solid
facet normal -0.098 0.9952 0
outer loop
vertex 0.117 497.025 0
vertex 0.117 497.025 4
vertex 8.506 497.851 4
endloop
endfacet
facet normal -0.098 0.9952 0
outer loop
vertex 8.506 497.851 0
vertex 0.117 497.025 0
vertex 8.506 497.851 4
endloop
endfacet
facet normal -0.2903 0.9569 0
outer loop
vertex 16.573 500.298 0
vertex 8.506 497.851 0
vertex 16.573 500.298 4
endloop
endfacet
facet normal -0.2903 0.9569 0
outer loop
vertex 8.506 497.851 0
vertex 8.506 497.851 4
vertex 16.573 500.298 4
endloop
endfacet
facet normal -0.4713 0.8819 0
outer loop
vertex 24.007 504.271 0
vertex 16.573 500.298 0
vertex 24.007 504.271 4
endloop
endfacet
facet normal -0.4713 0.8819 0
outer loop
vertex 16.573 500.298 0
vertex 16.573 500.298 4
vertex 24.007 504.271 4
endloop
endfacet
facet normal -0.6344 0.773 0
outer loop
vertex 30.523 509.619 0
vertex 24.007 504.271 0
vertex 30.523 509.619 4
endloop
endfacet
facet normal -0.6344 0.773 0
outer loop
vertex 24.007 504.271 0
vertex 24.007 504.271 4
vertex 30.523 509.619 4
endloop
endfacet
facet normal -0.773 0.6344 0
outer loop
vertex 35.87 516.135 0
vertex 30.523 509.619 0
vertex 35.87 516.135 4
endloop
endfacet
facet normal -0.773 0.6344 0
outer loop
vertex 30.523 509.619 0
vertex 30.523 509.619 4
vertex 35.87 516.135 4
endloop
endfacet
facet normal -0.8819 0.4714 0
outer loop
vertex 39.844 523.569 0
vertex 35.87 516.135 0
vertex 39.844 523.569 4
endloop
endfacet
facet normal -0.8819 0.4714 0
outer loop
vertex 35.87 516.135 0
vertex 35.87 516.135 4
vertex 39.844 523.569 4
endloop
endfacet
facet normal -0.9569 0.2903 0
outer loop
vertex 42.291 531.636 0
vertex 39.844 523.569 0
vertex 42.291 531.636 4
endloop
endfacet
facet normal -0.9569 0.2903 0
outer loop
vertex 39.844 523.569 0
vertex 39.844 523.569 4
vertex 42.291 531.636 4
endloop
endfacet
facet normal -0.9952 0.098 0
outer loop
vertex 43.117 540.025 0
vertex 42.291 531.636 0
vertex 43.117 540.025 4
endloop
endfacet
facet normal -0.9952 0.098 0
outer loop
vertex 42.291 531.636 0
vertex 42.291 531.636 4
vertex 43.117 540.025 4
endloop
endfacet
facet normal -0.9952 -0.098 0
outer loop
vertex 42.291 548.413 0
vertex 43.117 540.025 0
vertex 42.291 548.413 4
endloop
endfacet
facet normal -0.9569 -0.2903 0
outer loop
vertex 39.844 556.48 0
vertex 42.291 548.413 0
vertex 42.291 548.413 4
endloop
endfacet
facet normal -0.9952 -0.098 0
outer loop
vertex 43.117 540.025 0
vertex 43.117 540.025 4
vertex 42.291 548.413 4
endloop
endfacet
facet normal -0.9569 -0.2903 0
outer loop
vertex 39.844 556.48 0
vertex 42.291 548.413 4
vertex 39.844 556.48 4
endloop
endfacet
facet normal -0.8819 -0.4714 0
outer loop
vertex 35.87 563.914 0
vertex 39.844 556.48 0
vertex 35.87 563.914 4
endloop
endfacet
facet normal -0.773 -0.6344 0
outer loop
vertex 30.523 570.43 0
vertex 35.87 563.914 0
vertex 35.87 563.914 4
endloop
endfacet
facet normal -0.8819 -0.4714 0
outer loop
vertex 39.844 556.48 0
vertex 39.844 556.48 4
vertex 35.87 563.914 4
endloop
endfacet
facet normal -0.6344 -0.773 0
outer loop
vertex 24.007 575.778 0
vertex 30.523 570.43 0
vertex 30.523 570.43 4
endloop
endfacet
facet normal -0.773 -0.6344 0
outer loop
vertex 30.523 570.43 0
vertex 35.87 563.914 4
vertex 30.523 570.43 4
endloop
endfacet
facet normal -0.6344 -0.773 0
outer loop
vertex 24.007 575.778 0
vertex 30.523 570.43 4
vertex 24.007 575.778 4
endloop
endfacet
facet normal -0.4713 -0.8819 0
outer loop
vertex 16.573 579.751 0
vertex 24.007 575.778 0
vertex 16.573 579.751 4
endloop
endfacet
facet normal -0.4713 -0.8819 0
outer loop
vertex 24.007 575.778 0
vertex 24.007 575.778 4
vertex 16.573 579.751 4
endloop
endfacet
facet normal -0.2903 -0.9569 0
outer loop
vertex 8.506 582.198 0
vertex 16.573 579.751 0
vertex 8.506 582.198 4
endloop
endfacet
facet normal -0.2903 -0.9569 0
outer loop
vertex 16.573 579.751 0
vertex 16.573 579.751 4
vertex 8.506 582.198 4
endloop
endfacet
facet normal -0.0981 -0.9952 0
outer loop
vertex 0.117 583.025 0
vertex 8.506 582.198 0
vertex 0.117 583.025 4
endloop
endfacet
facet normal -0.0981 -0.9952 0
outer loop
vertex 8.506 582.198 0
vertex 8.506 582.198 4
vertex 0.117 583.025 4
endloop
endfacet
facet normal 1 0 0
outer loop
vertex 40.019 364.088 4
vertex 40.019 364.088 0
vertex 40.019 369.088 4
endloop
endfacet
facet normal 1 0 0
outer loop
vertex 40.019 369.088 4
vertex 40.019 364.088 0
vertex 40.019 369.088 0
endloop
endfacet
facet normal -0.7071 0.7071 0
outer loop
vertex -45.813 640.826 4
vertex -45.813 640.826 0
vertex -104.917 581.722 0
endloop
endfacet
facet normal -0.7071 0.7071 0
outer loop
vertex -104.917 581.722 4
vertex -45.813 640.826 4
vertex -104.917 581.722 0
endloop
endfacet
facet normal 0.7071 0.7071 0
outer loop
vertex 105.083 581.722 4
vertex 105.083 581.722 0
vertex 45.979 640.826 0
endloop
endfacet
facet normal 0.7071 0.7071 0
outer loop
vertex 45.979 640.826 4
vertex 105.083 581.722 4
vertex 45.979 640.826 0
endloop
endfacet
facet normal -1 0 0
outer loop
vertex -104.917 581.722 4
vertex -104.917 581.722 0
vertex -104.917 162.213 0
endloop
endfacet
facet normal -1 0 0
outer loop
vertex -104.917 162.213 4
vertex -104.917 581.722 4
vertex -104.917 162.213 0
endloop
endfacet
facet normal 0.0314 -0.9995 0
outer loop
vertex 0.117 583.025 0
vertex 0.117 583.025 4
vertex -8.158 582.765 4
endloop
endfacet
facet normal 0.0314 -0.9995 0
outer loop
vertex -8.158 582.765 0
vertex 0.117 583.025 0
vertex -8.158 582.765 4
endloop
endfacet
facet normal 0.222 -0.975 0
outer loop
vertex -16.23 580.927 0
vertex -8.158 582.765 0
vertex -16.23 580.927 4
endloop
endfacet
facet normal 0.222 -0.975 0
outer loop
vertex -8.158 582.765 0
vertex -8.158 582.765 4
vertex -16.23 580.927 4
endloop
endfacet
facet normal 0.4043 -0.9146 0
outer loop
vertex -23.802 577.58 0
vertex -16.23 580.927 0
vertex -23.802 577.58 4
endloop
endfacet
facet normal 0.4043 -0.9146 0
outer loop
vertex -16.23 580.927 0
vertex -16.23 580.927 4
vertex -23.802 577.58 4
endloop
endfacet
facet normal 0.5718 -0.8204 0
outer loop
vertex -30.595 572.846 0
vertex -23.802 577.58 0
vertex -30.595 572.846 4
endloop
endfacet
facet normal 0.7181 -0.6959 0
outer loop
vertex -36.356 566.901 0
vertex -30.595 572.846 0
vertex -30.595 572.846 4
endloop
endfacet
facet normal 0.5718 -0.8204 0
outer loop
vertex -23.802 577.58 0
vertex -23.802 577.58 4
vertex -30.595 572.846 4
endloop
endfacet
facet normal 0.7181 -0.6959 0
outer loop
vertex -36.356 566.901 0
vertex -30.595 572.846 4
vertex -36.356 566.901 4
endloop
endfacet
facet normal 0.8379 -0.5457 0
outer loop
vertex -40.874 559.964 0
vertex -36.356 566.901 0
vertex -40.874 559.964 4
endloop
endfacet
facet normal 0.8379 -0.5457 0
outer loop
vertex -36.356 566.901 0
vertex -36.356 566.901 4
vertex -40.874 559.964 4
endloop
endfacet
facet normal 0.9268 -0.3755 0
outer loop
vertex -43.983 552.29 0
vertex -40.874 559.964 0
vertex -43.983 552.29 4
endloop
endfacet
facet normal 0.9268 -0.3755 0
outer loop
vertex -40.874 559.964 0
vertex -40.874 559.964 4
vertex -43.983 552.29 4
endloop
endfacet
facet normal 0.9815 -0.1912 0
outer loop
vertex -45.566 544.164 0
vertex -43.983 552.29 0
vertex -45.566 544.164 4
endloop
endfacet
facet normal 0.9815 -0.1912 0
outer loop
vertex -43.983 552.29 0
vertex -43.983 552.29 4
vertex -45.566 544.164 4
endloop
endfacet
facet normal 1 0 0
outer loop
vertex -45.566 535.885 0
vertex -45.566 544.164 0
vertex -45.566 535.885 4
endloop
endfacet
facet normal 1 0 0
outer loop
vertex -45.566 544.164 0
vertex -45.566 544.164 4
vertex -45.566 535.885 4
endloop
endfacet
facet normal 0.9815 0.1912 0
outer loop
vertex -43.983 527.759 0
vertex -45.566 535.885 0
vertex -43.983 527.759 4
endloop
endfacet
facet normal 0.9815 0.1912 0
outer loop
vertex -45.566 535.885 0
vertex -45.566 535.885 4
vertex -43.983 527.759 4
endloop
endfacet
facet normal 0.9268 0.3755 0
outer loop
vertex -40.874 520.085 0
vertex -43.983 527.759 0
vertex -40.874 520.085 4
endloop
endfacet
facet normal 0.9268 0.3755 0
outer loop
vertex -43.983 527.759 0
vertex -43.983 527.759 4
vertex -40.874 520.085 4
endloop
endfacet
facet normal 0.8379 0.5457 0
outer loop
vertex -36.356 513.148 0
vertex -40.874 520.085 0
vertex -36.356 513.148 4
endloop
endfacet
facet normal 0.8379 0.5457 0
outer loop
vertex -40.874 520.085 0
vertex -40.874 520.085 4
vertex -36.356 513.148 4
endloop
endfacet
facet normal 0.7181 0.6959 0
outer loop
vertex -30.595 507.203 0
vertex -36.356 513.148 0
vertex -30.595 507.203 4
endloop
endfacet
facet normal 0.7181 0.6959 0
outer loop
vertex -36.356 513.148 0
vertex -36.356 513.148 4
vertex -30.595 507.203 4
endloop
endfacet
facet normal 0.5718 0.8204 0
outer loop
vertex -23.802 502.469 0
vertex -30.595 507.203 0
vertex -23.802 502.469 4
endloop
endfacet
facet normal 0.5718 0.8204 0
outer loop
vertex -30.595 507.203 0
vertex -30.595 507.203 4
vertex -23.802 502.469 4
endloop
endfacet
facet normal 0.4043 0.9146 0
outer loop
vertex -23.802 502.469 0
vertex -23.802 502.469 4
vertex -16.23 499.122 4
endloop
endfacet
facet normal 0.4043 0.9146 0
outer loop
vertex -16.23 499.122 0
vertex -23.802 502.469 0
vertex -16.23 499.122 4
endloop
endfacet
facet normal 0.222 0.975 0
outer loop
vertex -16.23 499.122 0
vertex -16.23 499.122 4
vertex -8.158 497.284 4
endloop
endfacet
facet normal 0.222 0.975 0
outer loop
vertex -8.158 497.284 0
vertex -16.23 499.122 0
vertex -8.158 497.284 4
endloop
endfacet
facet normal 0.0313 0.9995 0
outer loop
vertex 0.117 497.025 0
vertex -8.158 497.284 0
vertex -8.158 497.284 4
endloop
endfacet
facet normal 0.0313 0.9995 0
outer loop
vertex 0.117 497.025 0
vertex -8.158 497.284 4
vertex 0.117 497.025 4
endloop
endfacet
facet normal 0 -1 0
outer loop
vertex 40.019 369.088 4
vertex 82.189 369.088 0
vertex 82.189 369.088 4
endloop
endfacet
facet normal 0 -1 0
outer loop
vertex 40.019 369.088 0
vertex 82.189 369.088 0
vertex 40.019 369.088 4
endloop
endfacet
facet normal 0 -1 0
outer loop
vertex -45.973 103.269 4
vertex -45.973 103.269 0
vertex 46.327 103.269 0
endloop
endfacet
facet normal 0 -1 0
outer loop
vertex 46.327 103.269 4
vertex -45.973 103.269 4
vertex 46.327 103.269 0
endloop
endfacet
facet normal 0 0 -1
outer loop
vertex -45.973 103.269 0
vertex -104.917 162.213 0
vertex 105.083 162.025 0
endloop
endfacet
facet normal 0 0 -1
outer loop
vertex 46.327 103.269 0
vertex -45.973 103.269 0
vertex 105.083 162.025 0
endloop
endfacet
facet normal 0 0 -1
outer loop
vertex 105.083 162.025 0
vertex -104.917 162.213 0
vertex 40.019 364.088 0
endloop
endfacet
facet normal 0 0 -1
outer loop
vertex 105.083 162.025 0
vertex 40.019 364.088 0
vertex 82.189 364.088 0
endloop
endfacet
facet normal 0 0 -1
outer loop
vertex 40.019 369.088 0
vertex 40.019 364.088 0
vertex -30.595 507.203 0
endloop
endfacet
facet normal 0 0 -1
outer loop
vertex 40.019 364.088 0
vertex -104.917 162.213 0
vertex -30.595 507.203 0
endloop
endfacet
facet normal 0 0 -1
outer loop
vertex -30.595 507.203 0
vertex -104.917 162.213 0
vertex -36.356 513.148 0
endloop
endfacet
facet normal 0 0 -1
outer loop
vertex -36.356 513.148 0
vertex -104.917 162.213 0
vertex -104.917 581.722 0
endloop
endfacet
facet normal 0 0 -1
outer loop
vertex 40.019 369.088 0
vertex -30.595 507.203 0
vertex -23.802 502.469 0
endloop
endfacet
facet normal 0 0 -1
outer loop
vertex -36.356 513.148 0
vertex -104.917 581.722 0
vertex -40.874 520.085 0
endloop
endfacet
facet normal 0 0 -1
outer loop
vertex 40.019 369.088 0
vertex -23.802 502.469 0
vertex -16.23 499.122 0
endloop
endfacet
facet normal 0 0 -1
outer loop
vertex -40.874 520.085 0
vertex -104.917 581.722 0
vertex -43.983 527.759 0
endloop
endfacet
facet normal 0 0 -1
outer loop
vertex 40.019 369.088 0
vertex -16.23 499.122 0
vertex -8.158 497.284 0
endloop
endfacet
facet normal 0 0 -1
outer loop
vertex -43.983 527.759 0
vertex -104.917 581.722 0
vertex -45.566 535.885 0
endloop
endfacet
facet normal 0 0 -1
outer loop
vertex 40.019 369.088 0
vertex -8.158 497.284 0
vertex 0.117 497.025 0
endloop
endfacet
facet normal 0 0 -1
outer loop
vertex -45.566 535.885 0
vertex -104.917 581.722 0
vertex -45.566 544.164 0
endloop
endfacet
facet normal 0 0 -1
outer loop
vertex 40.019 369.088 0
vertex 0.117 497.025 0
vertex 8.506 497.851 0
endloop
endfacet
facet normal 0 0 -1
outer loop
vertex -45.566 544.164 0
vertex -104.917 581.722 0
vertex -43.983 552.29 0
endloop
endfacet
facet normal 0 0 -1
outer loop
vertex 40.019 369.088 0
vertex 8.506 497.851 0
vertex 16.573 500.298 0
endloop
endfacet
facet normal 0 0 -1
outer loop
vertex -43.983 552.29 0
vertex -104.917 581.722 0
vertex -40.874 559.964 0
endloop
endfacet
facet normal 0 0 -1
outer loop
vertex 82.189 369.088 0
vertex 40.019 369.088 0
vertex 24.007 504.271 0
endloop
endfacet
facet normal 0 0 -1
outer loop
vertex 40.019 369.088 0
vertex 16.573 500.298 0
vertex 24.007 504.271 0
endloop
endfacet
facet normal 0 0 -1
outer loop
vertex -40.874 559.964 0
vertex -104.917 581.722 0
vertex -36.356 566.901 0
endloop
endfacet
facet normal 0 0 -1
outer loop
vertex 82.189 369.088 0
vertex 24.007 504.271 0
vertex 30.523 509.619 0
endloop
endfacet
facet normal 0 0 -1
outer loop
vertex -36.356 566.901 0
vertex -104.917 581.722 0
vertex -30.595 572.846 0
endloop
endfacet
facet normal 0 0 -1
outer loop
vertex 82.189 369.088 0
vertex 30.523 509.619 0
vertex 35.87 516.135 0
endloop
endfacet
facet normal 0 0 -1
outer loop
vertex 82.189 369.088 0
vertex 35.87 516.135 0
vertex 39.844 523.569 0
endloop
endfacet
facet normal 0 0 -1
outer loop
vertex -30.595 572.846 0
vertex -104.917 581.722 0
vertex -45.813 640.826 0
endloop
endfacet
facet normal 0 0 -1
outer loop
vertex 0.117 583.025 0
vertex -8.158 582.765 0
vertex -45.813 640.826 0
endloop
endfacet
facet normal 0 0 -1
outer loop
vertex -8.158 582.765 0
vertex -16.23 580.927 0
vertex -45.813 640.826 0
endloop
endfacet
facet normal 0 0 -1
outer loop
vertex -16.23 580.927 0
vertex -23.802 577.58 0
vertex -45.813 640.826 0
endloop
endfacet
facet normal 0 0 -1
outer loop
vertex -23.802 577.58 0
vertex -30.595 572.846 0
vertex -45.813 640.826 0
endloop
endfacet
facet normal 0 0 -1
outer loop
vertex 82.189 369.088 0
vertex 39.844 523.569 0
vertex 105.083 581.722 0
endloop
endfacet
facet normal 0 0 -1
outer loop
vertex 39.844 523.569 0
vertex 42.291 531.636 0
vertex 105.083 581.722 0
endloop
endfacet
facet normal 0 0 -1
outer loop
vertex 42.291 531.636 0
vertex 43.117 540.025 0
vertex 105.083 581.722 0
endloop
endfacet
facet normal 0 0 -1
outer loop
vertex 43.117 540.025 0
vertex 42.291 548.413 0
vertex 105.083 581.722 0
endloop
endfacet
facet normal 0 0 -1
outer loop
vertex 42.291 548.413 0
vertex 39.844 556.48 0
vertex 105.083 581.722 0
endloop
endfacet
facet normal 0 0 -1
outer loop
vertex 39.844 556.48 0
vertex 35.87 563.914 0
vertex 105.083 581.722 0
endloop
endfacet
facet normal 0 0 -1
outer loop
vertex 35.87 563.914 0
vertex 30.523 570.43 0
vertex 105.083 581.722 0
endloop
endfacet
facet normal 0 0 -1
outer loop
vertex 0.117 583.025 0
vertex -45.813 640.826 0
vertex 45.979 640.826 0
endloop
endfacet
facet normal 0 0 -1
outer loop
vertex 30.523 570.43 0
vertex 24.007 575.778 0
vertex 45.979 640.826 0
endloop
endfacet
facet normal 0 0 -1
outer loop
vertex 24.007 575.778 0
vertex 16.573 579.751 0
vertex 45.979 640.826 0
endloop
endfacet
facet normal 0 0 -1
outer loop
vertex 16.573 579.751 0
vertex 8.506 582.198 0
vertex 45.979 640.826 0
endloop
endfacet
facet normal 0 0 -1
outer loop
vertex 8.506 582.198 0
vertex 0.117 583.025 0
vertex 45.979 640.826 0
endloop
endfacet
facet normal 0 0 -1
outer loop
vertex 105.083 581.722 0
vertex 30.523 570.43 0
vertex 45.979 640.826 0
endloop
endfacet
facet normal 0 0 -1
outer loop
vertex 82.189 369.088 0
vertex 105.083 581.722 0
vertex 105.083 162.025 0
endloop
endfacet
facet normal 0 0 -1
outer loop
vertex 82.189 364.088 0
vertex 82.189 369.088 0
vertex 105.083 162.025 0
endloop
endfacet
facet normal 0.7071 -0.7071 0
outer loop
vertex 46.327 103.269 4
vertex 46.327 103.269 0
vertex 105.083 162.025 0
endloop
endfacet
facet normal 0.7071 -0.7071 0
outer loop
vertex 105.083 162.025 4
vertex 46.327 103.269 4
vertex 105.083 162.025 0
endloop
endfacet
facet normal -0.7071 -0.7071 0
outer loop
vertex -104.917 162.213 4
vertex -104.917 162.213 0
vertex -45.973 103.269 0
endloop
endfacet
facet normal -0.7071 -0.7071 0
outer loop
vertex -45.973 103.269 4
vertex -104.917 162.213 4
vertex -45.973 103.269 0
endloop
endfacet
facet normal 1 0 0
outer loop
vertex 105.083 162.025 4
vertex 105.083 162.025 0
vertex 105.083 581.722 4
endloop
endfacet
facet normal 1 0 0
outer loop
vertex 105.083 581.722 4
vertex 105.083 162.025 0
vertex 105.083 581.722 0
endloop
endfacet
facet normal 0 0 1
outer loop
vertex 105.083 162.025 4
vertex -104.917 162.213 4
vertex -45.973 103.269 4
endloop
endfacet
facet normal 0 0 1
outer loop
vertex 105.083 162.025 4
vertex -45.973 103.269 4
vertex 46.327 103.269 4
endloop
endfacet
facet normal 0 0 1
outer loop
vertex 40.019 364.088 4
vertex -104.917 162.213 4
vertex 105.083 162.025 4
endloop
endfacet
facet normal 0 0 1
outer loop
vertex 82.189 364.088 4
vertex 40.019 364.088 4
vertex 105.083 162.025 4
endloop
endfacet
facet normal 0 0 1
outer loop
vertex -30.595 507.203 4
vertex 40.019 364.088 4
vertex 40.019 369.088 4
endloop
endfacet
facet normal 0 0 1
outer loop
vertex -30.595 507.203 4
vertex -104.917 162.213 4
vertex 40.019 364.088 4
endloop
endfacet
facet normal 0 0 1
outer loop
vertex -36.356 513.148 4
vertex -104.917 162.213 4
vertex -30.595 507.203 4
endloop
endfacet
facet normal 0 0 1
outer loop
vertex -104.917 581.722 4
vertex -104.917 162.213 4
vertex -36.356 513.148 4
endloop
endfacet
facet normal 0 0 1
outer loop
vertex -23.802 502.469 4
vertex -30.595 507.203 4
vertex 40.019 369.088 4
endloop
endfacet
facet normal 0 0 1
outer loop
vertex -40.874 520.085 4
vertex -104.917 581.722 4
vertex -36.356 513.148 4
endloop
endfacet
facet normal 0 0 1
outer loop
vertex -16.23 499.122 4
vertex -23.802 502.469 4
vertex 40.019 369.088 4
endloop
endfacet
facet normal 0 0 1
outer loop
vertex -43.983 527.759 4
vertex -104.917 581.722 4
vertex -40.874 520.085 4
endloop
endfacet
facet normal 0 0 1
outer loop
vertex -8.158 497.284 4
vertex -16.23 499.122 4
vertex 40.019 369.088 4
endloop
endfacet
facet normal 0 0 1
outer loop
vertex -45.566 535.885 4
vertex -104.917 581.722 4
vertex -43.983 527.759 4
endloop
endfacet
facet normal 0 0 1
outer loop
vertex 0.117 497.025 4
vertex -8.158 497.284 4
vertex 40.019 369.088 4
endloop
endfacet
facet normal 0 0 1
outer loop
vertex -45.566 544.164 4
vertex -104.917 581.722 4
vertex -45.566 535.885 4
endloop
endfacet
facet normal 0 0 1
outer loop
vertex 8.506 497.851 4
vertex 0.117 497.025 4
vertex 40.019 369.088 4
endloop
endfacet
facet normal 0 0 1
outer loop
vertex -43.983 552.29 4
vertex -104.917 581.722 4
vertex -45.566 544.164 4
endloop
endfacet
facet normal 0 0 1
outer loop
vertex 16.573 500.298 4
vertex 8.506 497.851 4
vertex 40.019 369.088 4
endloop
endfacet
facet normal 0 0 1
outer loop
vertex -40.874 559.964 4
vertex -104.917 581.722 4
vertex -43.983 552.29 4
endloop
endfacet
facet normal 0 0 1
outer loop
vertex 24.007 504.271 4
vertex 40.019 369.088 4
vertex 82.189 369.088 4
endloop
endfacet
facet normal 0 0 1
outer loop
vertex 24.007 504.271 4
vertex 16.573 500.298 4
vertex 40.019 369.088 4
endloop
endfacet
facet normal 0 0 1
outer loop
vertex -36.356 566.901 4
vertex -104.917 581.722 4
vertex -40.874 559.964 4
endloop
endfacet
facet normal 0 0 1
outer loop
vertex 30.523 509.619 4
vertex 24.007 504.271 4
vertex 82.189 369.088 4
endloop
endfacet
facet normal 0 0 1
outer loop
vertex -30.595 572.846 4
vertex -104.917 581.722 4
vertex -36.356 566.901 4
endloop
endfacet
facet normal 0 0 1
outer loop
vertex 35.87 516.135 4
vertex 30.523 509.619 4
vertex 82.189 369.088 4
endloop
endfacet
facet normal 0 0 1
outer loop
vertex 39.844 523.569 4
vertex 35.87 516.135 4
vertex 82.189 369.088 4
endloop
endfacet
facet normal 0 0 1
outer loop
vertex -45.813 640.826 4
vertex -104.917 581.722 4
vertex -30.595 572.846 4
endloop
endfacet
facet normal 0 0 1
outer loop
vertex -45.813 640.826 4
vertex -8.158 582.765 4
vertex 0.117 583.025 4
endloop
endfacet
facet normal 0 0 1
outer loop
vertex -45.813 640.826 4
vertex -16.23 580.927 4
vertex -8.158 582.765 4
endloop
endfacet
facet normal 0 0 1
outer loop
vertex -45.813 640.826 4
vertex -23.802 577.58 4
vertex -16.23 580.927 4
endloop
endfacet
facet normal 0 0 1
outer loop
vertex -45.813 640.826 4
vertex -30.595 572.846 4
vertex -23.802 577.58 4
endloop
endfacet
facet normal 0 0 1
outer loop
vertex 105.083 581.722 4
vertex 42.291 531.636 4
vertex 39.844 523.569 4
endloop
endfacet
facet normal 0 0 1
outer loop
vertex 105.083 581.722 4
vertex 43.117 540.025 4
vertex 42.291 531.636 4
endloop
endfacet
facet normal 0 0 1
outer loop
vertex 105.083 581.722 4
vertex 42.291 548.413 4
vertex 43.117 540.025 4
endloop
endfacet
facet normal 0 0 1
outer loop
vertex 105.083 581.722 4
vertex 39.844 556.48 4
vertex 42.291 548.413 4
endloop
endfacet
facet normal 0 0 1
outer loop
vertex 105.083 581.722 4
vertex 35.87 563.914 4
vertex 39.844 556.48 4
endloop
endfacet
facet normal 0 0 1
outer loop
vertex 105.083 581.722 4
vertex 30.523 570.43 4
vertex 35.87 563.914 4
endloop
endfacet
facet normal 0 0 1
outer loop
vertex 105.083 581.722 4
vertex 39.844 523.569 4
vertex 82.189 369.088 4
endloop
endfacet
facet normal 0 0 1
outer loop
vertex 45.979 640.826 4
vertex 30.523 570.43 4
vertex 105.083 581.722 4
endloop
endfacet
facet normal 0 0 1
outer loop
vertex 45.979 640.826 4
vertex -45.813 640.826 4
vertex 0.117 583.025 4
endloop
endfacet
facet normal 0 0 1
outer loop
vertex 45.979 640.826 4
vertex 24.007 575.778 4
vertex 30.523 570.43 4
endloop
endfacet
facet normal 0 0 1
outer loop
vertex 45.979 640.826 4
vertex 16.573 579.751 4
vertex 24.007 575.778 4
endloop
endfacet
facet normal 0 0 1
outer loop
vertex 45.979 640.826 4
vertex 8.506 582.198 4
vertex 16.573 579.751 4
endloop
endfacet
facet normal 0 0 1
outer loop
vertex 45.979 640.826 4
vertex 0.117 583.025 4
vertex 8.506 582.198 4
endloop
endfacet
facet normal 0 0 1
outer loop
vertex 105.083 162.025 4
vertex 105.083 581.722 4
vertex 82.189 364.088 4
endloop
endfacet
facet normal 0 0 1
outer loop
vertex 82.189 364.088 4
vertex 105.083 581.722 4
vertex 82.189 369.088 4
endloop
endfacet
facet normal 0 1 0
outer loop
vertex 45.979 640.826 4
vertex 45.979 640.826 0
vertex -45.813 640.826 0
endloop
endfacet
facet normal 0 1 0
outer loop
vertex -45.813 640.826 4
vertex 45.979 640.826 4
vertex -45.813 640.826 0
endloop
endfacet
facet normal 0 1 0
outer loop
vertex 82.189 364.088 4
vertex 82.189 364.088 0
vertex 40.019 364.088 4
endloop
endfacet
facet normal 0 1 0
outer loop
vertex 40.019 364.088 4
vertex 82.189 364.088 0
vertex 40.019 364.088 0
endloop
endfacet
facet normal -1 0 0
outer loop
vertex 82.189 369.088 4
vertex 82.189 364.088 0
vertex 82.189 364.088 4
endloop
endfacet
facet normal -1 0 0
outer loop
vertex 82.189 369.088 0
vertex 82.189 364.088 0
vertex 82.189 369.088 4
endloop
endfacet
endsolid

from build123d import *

# Parameters (mm, degrees)
EXTRUDE_1_DEPTH     = 4
CUT_EXTRUDE_1_DEPTH = 650.396885451
SKETCH_3_W          = 42.169531332
SKETCH_3_H          = 5.000000403
CUT_EXTRUDE_2_DEPTH = 650.396885451


with BuildPart() as part:
    # Эскиз1 → Вытянуть1 (new body)
    with BuildSketch(Plane.XY):
        Polygon((105.082921559, 581.722068254), (45.979042749, 640.825947064), (-45.813199631, 640.825947064), (-104.917078441, 581.722068254), (-104.917078441, 162.212880509), (-45.97317451, 103.268976578), (46.326817337, 103.268976578), (105.082921559, 162.0250808), align=None)
    extrude(amount=EXTRUDE_1_DEPTH)

    # Эскиз2 → Вырез-Вытянуть1 (cut, through all)
    with BuildSketch(Plane.XY.offset(4)):
        with BuildLine():
            ThreePointArc((0.117260776, 497.024602251), (43.117260776, 540.024602251), (0.117260776, 583.024602251))
            ThreePointArc((0.117260776, 583.024602251), (-45.765193681, 540.024602251), (0.117260776, 497.024602251))
        make_face()
    extrude(amount=-CUT_EXTRUDE_1_DEPTH, mode=Mode.SUBTRACT)

    # Эскиз3 → Вырез-Вытянуть2 (cut, through all)
    with BuildSketch(Plane(origin=(0, 0, 0), x_dir=(-1, 0, 0), z_dir=(0, 0, -1))):
        with Locations((-61.103979415, 366.588061036)):
            Rectangle(SKETCH_3_W, SKETCH_3_H)
    extrude(amount=-CUT_EXTRUDE_2_DEPTH, mode=Mode.SUBTRACT)


solid = part.part
